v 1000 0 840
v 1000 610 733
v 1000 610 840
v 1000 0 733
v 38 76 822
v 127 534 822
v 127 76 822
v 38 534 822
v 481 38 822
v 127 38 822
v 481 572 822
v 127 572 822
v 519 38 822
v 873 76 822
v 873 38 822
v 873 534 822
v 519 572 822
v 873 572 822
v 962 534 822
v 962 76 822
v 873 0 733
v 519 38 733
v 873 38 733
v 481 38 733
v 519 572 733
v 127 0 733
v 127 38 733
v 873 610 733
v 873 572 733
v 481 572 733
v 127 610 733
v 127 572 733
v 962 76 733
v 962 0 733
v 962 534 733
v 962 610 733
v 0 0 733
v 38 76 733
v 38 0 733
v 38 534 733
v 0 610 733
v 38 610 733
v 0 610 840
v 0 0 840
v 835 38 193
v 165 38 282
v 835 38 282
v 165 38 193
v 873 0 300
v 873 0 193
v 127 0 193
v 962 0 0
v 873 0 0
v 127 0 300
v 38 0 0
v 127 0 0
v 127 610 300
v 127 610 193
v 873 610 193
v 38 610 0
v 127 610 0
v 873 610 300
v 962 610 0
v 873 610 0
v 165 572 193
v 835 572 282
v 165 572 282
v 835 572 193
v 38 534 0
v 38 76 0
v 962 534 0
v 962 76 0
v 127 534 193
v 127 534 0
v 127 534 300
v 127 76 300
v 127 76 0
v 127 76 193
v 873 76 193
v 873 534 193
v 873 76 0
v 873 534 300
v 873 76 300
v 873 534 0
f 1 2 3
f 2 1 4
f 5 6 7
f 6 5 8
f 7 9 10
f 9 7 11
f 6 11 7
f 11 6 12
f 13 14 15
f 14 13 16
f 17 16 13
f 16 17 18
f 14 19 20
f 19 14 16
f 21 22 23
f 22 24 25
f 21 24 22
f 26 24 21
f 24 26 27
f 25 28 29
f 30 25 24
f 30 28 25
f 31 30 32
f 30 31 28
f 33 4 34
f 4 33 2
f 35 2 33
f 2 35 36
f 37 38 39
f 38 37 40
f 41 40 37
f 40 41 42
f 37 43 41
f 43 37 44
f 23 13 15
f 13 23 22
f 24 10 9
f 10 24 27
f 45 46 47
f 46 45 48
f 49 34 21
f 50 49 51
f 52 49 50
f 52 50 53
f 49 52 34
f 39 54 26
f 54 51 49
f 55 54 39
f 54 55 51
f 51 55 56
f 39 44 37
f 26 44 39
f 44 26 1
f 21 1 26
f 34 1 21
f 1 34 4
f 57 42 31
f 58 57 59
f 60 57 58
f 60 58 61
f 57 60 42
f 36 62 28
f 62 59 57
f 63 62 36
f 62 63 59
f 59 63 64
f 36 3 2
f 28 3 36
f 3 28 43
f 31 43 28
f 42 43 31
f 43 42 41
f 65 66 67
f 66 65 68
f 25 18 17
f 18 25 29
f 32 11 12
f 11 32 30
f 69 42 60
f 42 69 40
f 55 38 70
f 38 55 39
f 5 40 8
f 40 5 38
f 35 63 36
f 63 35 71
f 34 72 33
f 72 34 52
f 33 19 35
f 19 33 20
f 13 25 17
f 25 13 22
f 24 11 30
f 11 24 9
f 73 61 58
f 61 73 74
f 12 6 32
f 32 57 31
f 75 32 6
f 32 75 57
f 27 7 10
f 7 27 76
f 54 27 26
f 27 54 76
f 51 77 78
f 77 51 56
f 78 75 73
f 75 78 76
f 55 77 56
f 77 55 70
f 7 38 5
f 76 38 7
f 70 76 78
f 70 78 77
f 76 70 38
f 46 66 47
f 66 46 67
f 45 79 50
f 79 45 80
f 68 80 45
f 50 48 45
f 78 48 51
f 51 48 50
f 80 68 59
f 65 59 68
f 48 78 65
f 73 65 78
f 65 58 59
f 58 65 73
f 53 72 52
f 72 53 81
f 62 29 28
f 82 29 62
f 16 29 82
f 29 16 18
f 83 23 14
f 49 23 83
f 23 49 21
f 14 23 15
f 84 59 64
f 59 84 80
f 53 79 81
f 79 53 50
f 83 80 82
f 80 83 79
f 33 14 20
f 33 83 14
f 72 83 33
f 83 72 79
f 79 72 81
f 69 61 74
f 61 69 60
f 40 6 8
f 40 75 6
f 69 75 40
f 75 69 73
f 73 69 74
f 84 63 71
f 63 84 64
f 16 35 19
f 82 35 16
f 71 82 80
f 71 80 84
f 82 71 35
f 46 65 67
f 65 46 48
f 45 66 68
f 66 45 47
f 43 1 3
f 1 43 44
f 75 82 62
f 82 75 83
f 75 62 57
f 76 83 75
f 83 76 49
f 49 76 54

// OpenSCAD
// Archiyou -> OpenSCAD  |  script: workbench  |  units: mm
// OpenSCAD has no units: coordinates are in mm.
// Parts: 23 CSG, 0 baked, 0 2D
// Parameters at export, for reference only (nothing in this file is linked to them):
//   LENGTH = 1000
//   DEPTH = 610
//   HEIGHT = 840
//   BEAM_WIDTH = 89
//   BEAM_THICKNESS = 38
//   BOARD_THICKNESS = 18

$fn = 32;
PART = "";

// top length  (layer top)
module top_length() {
    color([0, 0.502, 0]) translate([500, 19, 777.5]) cube([1000, 38, 89], center = true);
}

// tableTopLatBeamBack  (layer top)
module tableTopLatBeamBack() {
    color([0, 0.502, 0]) translate([500, 591, 777.5]) cube([1000, 38, 89], center = true);
}

// top depth  (layer top)
module top_depth() {
    color([0, 0.502, 0]) translate([19, 305, 777.5]) cube([38, 534, 89], center = true);
}

// tableTopLatBeamRight  (layer top)
module tableTopLatBeamRight() {
    color([0, 0.502, 0]) translate([981, 305, 777.5]) cube([38, 534, 89], center = true);
}

// top depth  (layer top)
module top_depth_2() {
    color([0, 0.502, 0]) translate([500, 305, 777.5]) cube([38, 534, 89], center = true);
}

// leg long  (layer legs)
module leg_long() {
    color([1, 0, 0]) translate([82.5, 57, 411]) cube([89, 38, 822], center = true);
}

// leg mid  (layer legs)
module leg_mid() {
    color([1, 0, 0]) translate([82.5, 19, 507.5]) cube([89, 38, 451], center = true);
}

// leg bottom  (layer legs)
module leg_bottom() {
    color([1, 0, 0]) translate([82.5, 19, 96.5]) cube([89, 38, 193], center = true);
}

// leg long  (layer legs)
module leg_long_2() {
    color([1, 0, 0]) translate([917.5, 57, 411]) cube([89, 38, 822], center = true);
}

// leg mid  (layer legs)
module leg_mid_2() {
    color([1, 0, 0]) translate([917.5, 19, 507.5]) cube([89, 38, 451], center = true);
}

// leg bottom  (layer legs)
module leg_bottom_2() {
    color([1, 0, 0]) translate([917.5, 19, 96.5]) cube([89, 38, 193], center = true);
}

// leg long  (layer legs)
module leg_long_3() {
    color([1, 0, 0]) multmatrix([[1, 0, 0, 82.5], [0, -1, 0, 553], [0, 0, 1, 411], [0, 0, 0, 1]]) cube([89, 38, 822], center = true);
}

// leg mid  (layer legs)
module leg_mid_3() {
    color([1, 0, 0]) multmatrix([[1, 0, 0, 82.5], [0, -1, 0, 591], [0, 0, 1, 507.5], [0, 0, 0, 1]]) cube([89, 38, 451], center = true);
}

// leg bottom  (layer legs)
module leg_bottom_3() {
    color([1, 0, 0]) multmatrix([[1, 0, 0, 82.5], [0, -1, 0, 591], [0, 0, 1, 96.5], [0, 0, 0, 1]]) cube([89, 38, 193], center = true);
}

// leg long  (layer legs)
module leg_long_4() {
    color([1, 0, 0]) multmatrix([[1, 0, 0, 917.5], [0, -1, 0, 553], [0, 0, 1, 411], [0, 0, 0, 1]]) cube([89, 38, 822], center = true);
}

// leg mid  (layer legs)
module leg_mid_4() {
    color([1, 0, 0]) multmatrix([[1, 0, 0, 917.5], [0, -1, 0, 591], [0, 0, 1, 507.5], [0, 0, 0, 1]]) cube([89, 38, 451], center = true);
}

// leg bottom  (layer legs)
module leg_bottom_4() {
    color([1, 0, 0]) multmatrix([[1, 0, 0, 917.5], [0, -1, 0, 591], [0, 0, 1, 96.5], [0, 0, 0, 1]]) cube([89, 38, 193], center = true);
}

// along length  (layer laterals)
module along_length() {
    color([0.502, 0, 0.502]) translate([500, 19, 237.5]) cube([924, 38, 89], center = true);
}

// lateralLengthBack  (layer laterals)
module lateralLengthBack() {
    color([0.502, 0, 0.502]) translate([500, 591, 237.5]) cube([924, 38, 89], center = true);
}

// along depth  (layer laterals)
module along_depth() {
    color([0.502, 0, 0.502]) translate([146, 305, 237.5]) cube([38, 534, 89], center = true);
}

// lateralDepthRight  (layer laterals)
module lateralDepthRight() {
    color([0.502, 0, 0.502]) translate([854, 305, 237.5]) cube([38, 534, 89], center = true);
}

// tableTopBoard  (layer boards)
module tableTopBoard() {
    color([0, 0, 1]) translate([500, 305, 831]) cube([1000, 610, 18], center = true);
}

// bottomBoard  (layer boards)
module bottomBoard() {
    color([0, 0, 1]) translate([500, 305, 291]) cube([746, 610, 18], center = true);
}

// 3D parts
if (PART == "" || PART == "top_length") top_length();
if (PART == "" || PART == "tableTopLatBeamBack") tableTopLatBeamBack();
if (PART == "" || PART == "top_depth") top_depth();
if (PART == "" || PART == "tableTopLatBeamRight") tableTopLatBeamRight();
if (PART == "" || PART == "top_depth_2") top_depth_2();
if (PART == "" || PART == "leg_long") leg_long();
if (PART == "" || PART == "leg_mid") leg_mid();
if (PART == "" || PART == "leg_bottom") leg_bottom();
if (PART == "" || PART == "leg_long_2") leg_long_2();
if (PART == "" || PART == "leg_mid_2") leg_mid_2();
if (PART == "" || PART == "leg_bottom_2") leg_bottom_2();
if (PART == "" || PART == "leg_long_3") leg_long_3();
if (PART == "" || PART == "leg_mid_3") leg_mid_3();
if (PART == "" || PART == "leg_bottom_3") leg_bottom_3();
if (PART == "" || PART == "leg_long_4") leg_long_4();
if (PART == "" || PART == "leg_mid_4") leg_mid_4();
if (PART == "" || PART == "leg_bottom_4") leg_bottom_4();
if (PART == "" || PART == "along_length") along_length();
if (PART == "" || PART == "lateralLengthBack") lateralLengthBack();
if (PART == "" || PART == "along_depth") along_depth();
if (PART == "" || PART == "lateralDepthRight") lateralDepthRight();
if (PART == "" || PART == "tableTopBoard") tableTopBoard();
if (PART == "" || PART == "bottomBoard") bottomBoard();
